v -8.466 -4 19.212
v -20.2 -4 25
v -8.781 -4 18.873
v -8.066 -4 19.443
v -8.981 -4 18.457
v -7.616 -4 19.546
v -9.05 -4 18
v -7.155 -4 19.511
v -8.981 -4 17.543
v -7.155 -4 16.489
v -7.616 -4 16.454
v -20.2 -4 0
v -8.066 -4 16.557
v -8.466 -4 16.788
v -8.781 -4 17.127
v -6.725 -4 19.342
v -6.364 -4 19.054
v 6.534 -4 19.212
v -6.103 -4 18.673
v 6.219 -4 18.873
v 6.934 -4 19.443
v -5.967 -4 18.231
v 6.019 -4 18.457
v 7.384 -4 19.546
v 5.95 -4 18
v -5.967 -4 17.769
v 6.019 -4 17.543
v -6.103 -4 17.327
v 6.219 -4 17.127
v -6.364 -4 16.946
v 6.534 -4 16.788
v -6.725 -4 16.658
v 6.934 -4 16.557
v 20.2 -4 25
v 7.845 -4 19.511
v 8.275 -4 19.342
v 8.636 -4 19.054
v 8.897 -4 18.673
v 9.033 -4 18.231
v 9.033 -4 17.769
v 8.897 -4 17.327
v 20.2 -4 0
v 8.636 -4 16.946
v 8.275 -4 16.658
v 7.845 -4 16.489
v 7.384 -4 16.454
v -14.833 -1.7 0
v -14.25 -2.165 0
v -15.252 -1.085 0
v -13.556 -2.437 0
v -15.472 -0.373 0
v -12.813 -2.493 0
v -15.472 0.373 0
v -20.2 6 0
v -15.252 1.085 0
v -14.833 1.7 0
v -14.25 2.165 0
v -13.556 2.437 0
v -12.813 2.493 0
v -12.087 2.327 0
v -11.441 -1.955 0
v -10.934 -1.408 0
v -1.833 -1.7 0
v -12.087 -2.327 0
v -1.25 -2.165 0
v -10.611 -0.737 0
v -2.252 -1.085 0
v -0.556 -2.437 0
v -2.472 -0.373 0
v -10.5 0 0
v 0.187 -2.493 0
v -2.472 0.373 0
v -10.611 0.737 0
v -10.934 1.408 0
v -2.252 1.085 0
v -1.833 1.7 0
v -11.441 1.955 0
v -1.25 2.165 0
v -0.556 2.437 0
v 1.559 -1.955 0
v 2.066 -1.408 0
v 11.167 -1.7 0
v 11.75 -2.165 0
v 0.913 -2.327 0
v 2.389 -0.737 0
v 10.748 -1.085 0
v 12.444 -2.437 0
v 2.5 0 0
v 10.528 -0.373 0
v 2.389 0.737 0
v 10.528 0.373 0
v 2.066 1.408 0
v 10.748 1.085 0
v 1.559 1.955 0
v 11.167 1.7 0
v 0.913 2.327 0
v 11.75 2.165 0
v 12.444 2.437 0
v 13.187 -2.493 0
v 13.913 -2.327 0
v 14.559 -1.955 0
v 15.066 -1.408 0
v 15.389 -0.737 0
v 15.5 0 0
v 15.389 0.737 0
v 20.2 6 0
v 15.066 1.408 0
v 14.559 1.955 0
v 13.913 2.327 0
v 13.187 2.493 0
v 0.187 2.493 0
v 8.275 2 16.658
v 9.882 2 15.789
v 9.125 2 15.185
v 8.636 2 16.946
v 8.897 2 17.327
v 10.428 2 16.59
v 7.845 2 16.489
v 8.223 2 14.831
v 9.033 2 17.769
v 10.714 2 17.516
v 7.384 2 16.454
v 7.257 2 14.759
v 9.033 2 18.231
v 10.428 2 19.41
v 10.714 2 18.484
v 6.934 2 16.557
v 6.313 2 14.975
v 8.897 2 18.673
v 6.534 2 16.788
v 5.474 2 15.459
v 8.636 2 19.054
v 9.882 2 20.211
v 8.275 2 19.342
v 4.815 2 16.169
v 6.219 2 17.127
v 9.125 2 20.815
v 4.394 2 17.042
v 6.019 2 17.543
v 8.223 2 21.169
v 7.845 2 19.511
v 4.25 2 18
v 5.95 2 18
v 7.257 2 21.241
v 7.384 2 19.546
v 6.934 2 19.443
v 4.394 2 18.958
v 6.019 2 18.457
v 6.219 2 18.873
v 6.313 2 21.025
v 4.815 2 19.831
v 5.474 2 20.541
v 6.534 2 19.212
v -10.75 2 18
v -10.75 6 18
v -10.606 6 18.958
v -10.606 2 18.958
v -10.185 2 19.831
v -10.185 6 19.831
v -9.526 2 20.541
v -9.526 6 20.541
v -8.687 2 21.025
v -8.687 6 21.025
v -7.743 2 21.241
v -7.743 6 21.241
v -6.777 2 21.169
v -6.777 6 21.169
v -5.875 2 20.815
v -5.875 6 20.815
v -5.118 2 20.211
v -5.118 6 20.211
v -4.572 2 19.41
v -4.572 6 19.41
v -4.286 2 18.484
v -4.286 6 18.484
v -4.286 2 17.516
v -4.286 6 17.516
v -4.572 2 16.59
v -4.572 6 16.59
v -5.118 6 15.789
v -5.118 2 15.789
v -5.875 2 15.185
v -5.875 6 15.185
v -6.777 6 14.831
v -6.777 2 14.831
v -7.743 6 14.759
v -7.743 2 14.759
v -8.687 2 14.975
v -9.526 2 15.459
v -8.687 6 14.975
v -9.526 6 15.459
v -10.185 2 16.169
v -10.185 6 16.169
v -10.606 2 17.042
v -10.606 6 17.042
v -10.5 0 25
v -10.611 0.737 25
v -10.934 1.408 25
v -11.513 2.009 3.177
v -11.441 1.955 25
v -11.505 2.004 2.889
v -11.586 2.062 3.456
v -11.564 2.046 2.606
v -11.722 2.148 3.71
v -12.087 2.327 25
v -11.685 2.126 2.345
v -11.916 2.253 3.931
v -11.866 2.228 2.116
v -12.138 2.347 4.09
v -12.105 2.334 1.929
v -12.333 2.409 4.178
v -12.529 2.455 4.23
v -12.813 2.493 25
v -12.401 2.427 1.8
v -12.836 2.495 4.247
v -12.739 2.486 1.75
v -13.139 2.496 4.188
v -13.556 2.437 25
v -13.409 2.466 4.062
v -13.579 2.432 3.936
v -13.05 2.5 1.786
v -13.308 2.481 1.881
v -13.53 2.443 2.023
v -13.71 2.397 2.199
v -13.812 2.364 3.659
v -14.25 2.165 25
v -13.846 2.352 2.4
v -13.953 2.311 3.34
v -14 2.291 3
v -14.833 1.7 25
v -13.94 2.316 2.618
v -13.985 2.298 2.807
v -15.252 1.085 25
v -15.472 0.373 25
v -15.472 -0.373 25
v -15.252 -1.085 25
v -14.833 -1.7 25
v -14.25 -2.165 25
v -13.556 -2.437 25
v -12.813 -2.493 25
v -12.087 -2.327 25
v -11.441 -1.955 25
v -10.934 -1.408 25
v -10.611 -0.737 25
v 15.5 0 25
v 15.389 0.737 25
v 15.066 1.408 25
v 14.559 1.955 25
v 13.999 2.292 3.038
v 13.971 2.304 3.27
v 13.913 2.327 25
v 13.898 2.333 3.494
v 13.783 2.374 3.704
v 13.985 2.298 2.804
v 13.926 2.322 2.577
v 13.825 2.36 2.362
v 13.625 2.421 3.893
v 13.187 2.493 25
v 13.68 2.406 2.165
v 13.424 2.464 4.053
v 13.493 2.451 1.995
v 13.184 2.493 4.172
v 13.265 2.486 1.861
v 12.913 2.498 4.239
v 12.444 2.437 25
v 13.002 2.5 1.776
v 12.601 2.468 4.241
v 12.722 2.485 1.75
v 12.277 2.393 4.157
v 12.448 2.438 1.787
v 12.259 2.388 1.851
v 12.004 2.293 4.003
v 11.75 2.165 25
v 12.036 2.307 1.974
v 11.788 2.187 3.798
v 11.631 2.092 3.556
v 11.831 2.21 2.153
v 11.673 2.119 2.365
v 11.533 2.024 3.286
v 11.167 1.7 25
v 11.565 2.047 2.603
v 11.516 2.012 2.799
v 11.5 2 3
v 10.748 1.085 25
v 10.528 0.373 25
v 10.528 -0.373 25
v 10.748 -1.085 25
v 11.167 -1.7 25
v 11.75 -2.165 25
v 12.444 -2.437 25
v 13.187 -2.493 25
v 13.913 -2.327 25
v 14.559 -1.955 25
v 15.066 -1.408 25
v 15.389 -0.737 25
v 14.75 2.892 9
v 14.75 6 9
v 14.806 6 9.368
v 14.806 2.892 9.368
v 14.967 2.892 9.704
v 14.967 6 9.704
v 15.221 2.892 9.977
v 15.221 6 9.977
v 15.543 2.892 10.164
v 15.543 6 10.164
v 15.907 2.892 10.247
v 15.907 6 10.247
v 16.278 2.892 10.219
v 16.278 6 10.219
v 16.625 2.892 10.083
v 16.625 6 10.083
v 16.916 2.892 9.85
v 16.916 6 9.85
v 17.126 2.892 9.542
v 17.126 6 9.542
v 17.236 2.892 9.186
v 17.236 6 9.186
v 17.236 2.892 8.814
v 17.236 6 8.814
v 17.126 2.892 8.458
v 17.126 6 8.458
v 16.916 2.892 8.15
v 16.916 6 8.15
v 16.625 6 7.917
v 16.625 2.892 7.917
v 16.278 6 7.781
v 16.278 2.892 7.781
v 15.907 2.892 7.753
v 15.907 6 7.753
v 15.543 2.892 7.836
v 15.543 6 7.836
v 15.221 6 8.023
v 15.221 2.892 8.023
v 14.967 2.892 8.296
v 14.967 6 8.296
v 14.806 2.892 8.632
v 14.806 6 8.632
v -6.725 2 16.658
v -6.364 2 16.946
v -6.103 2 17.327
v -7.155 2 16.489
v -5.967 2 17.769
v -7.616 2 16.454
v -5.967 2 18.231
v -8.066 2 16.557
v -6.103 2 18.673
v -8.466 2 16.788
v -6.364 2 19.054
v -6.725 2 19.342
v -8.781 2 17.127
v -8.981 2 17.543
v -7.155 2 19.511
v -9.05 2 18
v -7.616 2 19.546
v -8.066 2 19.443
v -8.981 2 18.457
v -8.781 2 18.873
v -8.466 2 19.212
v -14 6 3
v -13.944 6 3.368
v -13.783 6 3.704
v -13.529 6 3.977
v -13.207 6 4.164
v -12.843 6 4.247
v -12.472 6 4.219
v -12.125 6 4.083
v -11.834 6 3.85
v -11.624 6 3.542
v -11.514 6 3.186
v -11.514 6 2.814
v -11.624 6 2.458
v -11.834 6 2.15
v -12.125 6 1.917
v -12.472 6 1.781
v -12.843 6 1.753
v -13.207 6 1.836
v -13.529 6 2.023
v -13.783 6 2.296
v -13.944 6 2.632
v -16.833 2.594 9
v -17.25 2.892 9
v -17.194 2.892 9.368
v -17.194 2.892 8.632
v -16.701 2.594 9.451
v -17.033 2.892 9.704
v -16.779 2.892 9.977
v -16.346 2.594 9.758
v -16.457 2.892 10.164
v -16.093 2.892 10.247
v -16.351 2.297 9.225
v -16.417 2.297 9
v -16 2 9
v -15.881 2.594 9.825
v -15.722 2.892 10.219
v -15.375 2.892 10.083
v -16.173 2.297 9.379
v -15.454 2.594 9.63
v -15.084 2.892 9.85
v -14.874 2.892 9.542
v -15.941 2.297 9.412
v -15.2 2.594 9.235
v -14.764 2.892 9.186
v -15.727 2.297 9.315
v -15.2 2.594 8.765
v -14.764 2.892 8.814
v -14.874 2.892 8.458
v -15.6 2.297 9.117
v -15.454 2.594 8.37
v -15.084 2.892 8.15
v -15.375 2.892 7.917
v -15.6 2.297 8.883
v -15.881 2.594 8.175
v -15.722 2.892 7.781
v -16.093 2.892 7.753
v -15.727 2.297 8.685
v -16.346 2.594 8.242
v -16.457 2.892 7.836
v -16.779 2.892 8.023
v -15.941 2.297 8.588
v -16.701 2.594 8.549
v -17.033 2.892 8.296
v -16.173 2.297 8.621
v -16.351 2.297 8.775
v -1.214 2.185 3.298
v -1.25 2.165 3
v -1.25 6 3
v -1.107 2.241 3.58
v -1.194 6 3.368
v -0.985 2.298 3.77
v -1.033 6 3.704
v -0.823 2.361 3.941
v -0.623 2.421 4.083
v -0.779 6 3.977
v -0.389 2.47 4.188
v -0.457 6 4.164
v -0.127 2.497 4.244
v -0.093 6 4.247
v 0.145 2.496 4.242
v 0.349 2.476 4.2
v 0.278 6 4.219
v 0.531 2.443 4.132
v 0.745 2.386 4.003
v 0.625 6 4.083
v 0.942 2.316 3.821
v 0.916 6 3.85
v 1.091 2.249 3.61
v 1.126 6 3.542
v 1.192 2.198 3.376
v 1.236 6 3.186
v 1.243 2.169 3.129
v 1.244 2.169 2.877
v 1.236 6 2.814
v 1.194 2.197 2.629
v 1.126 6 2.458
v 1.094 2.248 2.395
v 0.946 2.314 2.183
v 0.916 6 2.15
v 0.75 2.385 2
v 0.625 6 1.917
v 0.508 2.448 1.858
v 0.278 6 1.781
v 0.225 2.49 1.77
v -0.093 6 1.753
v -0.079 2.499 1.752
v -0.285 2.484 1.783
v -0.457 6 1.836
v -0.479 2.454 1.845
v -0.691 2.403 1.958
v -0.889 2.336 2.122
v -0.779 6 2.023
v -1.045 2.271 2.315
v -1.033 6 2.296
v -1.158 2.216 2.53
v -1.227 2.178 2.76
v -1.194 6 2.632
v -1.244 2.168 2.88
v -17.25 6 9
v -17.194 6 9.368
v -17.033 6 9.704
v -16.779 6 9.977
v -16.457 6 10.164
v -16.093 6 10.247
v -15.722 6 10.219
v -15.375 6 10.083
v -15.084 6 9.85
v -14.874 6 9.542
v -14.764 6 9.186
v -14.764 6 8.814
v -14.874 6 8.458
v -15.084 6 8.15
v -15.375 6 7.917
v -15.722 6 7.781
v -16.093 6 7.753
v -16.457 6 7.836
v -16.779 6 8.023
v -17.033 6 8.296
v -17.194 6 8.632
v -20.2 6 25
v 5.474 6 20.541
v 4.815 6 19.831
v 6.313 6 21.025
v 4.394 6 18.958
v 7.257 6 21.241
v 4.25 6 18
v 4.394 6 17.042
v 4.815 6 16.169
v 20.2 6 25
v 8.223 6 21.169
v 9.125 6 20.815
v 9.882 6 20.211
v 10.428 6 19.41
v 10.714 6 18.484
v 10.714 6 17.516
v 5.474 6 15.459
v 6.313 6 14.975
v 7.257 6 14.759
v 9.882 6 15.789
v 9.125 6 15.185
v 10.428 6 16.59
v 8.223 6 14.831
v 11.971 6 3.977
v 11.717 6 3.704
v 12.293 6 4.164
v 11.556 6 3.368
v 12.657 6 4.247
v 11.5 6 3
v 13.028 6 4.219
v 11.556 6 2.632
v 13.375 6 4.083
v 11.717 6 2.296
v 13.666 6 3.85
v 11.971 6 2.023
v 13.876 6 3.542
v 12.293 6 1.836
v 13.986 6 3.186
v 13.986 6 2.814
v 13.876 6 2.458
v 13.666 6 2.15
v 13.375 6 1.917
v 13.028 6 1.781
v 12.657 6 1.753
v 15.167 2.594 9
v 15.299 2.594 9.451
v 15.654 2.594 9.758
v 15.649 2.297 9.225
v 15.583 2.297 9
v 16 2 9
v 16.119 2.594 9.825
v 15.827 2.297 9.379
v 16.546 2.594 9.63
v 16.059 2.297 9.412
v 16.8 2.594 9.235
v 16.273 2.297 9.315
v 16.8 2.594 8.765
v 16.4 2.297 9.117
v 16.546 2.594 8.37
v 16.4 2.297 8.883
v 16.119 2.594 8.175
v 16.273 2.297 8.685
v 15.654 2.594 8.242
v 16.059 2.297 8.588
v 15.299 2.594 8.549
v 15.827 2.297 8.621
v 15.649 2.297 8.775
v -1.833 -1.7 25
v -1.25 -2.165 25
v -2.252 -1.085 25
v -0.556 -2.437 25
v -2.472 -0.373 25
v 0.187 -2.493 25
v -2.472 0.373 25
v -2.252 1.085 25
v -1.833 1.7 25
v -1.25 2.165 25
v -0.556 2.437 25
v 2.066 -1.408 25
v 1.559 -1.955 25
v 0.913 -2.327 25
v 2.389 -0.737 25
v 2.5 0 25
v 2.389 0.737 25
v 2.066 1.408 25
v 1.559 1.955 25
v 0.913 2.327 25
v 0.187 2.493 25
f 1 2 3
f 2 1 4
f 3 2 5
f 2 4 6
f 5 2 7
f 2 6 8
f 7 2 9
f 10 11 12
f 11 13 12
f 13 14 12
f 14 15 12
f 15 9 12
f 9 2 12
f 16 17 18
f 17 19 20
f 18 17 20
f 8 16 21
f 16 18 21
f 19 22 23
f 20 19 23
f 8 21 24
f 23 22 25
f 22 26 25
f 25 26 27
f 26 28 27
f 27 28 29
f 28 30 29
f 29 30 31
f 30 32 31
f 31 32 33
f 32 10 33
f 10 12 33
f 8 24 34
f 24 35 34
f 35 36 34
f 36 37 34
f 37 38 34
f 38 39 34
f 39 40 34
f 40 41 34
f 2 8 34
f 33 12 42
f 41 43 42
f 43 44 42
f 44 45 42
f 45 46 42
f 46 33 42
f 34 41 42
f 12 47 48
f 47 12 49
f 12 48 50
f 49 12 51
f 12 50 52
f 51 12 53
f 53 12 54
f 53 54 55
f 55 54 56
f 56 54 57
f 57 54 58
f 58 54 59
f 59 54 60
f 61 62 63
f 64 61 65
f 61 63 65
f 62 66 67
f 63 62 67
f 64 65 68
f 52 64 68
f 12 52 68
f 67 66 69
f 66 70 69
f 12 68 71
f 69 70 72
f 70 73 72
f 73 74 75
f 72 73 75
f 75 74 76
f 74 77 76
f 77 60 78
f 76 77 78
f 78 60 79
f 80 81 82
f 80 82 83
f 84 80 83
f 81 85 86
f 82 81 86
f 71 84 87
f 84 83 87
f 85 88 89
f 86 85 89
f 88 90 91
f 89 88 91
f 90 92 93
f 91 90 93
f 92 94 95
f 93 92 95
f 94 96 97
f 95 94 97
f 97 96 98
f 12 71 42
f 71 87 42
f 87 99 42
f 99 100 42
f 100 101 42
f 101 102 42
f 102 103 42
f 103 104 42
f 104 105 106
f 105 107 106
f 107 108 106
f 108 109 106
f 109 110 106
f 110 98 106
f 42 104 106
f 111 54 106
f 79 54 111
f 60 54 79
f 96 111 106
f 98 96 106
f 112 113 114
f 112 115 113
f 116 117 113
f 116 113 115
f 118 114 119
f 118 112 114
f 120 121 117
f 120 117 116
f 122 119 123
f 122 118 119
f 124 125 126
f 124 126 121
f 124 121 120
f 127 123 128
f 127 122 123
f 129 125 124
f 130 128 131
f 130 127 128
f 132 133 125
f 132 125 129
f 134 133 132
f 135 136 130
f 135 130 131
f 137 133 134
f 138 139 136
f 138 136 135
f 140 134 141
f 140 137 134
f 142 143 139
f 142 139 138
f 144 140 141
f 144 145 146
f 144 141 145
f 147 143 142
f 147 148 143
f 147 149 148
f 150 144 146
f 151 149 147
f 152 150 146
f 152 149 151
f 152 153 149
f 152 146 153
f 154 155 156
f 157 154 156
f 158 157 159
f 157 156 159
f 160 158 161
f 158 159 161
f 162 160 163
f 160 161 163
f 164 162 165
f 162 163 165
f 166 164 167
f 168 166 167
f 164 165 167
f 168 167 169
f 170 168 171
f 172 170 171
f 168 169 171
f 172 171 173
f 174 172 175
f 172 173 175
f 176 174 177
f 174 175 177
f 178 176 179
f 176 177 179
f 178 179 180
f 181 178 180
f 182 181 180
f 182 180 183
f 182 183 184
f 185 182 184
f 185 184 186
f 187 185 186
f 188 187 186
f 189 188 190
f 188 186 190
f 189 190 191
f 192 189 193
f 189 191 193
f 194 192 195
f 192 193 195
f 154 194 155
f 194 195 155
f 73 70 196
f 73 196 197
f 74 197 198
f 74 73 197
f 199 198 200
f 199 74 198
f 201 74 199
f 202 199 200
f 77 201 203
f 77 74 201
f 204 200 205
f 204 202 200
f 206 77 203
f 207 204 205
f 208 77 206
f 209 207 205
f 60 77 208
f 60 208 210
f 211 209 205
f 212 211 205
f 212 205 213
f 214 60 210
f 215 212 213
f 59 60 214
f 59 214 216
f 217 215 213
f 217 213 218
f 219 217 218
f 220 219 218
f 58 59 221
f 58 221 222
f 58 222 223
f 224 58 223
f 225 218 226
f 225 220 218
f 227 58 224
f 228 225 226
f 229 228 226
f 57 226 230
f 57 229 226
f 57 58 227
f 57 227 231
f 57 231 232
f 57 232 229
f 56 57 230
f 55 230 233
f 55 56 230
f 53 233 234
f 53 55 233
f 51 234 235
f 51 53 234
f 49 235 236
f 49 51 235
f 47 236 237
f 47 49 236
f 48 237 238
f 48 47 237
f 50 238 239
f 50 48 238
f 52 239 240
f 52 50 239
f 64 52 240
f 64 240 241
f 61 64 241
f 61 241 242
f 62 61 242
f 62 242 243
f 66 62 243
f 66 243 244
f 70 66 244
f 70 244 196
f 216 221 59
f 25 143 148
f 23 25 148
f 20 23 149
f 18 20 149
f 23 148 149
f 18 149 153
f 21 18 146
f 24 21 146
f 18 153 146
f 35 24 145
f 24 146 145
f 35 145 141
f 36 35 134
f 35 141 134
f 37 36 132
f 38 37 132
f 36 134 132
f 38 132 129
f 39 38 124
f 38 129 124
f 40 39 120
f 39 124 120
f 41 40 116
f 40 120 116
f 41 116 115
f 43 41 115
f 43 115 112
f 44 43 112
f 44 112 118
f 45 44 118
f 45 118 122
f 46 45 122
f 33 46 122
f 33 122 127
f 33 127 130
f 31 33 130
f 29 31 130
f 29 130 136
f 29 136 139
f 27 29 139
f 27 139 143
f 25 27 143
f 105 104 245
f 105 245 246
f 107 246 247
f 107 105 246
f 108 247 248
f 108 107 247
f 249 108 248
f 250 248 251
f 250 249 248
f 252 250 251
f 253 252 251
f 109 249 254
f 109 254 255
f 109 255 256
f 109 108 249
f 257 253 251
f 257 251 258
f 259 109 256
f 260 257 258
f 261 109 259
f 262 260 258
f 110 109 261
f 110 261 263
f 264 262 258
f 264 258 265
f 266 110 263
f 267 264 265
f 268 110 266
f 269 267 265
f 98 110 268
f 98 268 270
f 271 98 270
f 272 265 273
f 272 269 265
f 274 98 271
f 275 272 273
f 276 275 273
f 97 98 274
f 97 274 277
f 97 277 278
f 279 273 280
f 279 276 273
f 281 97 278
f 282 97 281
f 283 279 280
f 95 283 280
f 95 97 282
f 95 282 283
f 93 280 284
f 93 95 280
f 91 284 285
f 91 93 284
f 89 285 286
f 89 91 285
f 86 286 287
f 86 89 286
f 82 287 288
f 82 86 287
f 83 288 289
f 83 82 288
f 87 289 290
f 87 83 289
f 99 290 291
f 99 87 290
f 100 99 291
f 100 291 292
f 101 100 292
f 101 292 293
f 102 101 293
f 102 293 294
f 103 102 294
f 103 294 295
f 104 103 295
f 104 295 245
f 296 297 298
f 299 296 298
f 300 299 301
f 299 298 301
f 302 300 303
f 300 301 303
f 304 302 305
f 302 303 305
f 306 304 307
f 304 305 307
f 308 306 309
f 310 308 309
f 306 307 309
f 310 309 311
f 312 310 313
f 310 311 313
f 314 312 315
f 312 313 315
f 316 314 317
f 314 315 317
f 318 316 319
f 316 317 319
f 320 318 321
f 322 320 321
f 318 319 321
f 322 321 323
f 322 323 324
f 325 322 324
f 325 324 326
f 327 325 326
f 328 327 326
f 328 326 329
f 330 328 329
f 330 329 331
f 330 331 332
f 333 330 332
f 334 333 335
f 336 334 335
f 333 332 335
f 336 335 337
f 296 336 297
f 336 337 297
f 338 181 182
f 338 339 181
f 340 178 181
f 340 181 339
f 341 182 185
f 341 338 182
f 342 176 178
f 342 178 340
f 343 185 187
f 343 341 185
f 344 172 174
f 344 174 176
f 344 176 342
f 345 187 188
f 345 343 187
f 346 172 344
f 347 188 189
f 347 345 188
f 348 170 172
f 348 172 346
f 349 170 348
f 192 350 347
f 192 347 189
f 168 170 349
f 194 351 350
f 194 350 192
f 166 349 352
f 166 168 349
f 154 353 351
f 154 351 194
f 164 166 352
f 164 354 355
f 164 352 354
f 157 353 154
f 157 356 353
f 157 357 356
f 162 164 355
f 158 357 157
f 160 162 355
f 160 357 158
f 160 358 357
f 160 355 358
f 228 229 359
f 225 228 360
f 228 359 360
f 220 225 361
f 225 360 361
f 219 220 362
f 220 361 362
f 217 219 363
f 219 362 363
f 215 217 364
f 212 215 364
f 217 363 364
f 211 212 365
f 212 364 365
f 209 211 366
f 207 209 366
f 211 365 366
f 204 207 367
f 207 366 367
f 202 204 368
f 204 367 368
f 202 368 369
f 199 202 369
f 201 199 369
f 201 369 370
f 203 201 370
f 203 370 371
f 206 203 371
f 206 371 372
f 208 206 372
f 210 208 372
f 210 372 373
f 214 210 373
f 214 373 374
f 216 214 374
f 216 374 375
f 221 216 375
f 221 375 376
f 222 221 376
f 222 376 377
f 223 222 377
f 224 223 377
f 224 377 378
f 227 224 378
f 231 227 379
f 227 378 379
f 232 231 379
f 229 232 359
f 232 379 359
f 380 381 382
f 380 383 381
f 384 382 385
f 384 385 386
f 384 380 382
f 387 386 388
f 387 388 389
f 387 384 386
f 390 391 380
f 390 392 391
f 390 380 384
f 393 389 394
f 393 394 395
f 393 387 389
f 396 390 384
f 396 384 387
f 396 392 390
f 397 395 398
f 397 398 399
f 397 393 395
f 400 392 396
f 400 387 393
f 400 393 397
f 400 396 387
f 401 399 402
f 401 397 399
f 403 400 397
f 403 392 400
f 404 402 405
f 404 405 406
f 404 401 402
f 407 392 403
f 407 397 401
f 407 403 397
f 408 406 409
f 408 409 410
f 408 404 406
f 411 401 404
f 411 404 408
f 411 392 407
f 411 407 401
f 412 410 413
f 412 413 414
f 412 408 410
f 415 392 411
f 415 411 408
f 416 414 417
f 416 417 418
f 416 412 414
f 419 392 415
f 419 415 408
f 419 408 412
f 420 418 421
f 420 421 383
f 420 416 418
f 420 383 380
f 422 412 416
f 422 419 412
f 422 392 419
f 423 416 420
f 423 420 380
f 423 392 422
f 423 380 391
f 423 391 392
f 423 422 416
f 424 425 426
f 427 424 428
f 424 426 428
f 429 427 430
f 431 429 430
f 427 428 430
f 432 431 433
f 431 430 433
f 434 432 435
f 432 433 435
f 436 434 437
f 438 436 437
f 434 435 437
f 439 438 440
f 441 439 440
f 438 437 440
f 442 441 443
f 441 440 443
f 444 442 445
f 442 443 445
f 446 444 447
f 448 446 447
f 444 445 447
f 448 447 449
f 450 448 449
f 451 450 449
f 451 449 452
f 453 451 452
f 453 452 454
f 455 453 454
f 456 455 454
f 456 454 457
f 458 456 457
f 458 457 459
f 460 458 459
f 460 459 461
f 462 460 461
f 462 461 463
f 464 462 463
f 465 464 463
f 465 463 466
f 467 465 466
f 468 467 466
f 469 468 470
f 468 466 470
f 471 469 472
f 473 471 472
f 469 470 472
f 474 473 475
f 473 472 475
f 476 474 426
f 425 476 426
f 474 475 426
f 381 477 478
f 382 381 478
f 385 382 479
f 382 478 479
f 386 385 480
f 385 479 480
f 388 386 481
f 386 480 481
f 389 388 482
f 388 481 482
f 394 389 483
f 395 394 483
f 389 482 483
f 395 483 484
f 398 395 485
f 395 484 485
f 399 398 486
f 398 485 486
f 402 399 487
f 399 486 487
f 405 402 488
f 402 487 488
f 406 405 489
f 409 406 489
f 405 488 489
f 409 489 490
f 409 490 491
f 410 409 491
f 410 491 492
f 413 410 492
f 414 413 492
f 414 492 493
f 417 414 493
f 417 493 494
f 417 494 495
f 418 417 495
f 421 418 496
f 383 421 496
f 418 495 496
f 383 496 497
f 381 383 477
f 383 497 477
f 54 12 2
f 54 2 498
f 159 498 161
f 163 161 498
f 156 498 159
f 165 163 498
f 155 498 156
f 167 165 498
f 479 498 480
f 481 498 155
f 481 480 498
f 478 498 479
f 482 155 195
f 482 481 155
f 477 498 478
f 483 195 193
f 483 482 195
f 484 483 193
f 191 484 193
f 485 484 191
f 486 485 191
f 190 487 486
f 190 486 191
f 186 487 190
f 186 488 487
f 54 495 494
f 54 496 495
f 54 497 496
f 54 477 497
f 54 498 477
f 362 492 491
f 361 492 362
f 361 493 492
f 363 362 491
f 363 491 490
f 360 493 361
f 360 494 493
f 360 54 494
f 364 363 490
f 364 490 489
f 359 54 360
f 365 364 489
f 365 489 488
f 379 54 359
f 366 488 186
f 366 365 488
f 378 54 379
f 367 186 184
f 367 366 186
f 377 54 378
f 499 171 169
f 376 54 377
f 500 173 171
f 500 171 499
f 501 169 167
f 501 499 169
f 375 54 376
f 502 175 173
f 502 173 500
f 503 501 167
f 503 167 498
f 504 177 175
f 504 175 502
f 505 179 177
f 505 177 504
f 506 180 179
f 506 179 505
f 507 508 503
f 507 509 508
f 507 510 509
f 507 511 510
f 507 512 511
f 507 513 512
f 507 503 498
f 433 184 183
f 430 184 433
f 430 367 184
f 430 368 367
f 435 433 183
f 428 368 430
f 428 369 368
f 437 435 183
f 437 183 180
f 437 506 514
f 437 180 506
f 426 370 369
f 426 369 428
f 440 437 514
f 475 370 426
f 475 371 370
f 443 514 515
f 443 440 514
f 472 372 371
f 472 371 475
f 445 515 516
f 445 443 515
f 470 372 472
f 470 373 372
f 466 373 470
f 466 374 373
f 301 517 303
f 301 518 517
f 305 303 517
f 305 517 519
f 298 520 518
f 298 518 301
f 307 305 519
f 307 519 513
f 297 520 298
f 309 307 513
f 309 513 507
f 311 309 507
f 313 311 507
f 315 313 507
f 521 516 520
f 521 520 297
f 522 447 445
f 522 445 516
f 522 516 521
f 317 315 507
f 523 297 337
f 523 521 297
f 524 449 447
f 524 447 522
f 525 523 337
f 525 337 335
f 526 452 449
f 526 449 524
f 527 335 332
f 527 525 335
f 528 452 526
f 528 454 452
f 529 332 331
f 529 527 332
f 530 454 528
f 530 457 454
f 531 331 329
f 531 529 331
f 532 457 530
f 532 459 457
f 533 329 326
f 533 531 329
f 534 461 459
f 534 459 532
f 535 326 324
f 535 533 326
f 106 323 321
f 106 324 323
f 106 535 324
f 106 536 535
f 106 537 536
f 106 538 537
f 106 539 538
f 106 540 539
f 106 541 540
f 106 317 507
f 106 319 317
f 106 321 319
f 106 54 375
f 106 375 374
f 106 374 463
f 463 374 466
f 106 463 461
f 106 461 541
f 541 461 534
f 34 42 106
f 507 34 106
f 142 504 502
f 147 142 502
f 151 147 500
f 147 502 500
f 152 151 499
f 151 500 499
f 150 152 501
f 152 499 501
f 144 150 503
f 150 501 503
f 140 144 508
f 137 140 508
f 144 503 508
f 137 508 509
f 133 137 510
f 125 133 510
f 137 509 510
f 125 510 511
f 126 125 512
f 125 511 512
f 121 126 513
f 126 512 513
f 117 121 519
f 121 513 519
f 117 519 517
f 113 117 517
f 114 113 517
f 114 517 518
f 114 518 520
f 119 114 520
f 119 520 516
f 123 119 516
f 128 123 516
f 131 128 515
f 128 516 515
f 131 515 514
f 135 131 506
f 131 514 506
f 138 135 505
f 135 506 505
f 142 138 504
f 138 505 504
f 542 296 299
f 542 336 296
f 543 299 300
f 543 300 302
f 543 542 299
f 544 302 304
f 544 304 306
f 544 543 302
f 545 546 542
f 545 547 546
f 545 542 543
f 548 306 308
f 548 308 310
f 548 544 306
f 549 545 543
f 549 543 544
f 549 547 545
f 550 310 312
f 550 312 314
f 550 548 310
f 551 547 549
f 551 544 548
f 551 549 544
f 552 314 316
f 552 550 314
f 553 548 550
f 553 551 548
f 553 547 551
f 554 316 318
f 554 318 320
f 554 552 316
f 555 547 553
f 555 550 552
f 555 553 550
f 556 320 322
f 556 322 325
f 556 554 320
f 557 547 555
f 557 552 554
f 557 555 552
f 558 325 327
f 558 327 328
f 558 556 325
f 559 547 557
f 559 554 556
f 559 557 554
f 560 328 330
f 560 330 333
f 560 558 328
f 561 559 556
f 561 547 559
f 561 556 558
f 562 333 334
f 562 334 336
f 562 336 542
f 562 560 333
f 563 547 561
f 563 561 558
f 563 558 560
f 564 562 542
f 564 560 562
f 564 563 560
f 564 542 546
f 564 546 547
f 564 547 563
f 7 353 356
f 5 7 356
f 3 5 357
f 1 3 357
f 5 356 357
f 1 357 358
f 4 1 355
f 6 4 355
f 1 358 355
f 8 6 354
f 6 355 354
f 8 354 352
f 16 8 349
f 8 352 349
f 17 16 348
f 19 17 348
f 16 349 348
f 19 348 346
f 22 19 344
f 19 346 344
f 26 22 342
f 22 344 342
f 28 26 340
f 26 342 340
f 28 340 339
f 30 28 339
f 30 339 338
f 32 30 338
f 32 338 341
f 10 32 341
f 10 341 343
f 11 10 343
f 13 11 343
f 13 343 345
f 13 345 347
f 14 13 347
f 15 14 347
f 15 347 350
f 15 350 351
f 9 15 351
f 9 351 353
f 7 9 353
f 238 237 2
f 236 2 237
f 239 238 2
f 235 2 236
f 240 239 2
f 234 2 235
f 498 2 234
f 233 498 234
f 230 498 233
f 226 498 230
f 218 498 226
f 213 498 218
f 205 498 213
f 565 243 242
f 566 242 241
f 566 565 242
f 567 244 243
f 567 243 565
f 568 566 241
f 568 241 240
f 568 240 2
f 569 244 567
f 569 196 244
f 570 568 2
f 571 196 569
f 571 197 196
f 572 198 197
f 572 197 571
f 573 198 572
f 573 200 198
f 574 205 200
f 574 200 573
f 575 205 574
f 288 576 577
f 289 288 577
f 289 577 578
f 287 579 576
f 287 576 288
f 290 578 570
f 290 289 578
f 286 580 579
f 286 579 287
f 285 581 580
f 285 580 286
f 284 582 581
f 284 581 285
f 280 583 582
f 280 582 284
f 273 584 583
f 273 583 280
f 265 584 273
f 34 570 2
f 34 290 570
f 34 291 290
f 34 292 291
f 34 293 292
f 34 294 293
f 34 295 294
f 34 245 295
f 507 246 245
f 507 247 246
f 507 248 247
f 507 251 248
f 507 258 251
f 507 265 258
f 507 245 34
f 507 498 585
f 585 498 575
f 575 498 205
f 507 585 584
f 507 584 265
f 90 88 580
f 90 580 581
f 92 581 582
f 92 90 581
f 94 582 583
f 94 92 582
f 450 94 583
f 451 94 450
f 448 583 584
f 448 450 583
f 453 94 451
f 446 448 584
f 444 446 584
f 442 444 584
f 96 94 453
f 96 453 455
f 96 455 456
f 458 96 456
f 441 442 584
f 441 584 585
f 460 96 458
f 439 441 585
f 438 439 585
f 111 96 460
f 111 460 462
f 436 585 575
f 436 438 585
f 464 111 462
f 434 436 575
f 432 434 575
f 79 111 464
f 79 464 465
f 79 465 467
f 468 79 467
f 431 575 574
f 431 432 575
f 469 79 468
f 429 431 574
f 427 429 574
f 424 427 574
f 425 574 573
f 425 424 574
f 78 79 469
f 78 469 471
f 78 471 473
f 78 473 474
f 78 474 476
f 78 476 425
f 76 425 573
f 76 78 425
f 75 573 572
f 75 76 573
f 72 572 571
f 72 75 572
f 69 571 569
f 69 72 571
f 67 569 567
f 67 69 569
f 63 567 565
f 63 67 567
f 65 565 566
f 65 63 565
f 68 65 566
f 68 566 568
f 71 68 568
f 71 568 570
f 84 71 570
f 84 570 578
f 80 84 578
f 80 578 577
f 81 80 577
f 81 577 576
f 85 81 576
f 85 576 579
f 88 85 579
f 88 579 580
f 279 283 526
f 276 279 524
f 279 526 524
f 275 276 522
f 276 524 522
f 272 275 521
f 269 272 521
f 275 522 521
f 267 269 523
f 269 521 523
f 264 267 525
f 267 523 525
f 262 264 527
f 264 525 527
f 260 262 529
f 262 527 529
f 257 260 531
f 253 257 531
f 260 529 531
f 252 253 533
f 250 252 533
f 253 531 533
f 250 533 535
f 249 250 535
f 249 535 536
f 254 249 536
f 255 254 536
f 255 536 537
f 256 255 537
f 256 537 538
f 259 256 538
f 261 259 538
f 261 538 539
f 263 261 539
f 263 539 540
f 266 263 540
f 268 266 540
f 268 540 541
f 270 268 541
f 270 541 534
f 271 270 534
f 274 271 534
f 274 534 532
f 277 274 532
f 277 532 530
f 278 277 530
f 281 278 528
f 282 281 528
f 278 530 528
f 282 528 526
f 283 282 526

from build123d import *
from OCP.BRepFilletAPI import BRepFilletAPI_MakeChamfer

# Parameters (mm, degrees)
SKETCH1_W           = 40.4
SKETCH1_H           = 10
SKETCH1_R           = 2.5
BOSS_EXTRUDE1_DEPTH = 25
SKETCH2_R           = 1.55
CUT_EXTRUDE1_DEPTH  = 34.66065953
CUT_EXTRUDE2_REACH  = 35.661
SKETCH3_R           = 1.25
SKETCH4_R           = 1.25
CUT_EXTRUDE3_DEPTH  = 4
CHAMFER1_SIZE       = 0.891616335
CHAMFER1_SIZE_2     = 1.25
SKETCH5_R           = 3.25
CUT_EXTRUDE4_DEPTH  = 4


with BuildPart() as part:
    # Sketch1 → Boss-Extrude1 (new body)
    with BuildSketch(Plane.XY):
        with Locations((0, 1)):
            Rectangle(SKETCH1_W, SKETCH1_H)
        Circle(SKETCH1_R, mode=Mode.SUBTRACT)
        with Locations((13, 0)):
            Circle(SKETCH1_R, mode=Mode.SUBTRACT)
        with Locations((-13, 0)):
            Circle(SKETCH1_R, mode=Mode.SUBTRACT)
    extrude(amount=BOSS_EXTRUDE1_DEPTH)

    # Sketch2 → Cut-Extrude1 (cut, through all)
    with BuildSketch(Plane(origin=(0, 6, 0), x_dir=(1, 0, 0), z_dir=(0, 1, 0))):
        with Locations(Location((7.5, -18, 0), (0, 0, 180))):
            Circle(SKETCH2_R)
        with Locations(Location((-7.5, -18, 0), (0, 0, 180))):
            Circle(SKETCH2_R)
    extrude(amount=-CUT_EXTRUDE1_DEPTH, mode=Mode.SUBTRACT)

    # Sketch3 → Cut-Extrude2 (cut, up to next)
    with BuildSketch(Plane(origin=(0, 6, 0), x_dir=(1, 0, 0), z_dir=(0, 1, 0)), mode=Mode.PRIVATE) as cut_extrude2_sk1:
        with Locations(Location((0, -3, 0), (0, 0, 180))):
            Circle(SKETCH3_R)
    cut_extrude2_tool1 = extrude(cut_extrude2_sk1.sketch, amount=-CUT_EXTRUDE2_REACH, mode=Mode.PRIVATE) & part.part
    # Sketch3 → Cut-Extrude2 (cut, up to next)
    with BuildSketch(Plane(origin=(0, 6, 0), x_dir=(1, 0, 0), z_dir=(0, 1, 0)), mode=Mode.PRIVATE) as cut_extrude2_sk2:
        with Locations(Location((-12.75, -3, 0), (0, 0, 180))):
            Circle(SKETCH3_R)
    cut_extrude2_tool2 = extrude(cut_extrude2_sk2.sketch, amount=-CUT_EXTRUDE2_REACH, mode=Mode.PRIVATE) & part.part
    # Sketch3 → Cut-Extrude2 (cut, up to next)
    with BuildSketch(Plane(origin=(0, 6, 0), x_dir=(1, 0, 0), z_dir=(0, 1, 0)), mode=Mode.PRIVATE) as cut_extrude2_sk3:
        with Locations(Location((12.75, -3, 0), (0, 0, 180))):
            Circle(SKETCH3_R)
    cut_extrude2_tool3 = extrude(cut_extrude2_sk3.sketch, amount=-CUT_EXTRUDE2_REACH, mode=Mode.PRIVATE) & part.part
    add(cut_extrude2_tool1.solids().sort_by_distance((0, 6, 3))[0], mode=Mode.SUBTRACT)
    add(cut_extrude2_tool2.solids().sort_by_distance((-12.75, 6, 3))[0], mode=Mode.SUBTRACT)
    add(cut_extrude2_tool3.solids().sort_by_distance((12.75, 6, 3))[0], mode=Mode.SUBTRACT)

    # Sketch4 → Cut-Extrude3 (cut)
    with BuildSketch(Plane(origin=(0, 6, 0), x_dir=(1, 0, 0), z_dir=(0, 1, 0))):
        with Locations(Location((-16, -9, 0), (0, 0, 180))):
            Circle(SKETCH4_R)
        with Locations(Location((16, -9, 0), (0, 0, 180))):
            Circle(SKETCH4_R)
    extrude(amount=-CUT_EXTRUDE3_DEPTH, mode=Mode.SUBTRACT)

    # Chamfer1
    chamfer1_edges_1 = [part.edges().sort_by_distance(p)[0] for p in [
        (-14.75, 2, 9),
    ]]
    chamfer1_side_1 = [part.faces().sort_by_distance(p)[0] for p in [
        (-14.75, 2.017832327, 9),
    ]]
    chamfer1_edges_2 = [part.edges().sort_by_distance(p)[0] for p in [
        (17.25, 2, 9),
    ]]
    chamfer1_side_2 = [part.faces().sort_by_distance(p)[0] for p in [
        (17.25, 2.017832327, 9),
    ]]
    chamfer1 = BRepFilletAPI_MakeChamfer(part.part.solid().wrapped)
    for e in chamfer1_edges_1:
        chamfer1.Add(CHAMFER1_SIZE - 0.0001, CHAMFER1_SIZE_2 - 0.0001, e.wrapped, chamfer1_side_1[0].wrapped)
    for e in chamfer1_edges_2:
        chamfer1.Add(CHAMFER1_SIZE - 0.0001, CHAMFER1_SIZE_2 - 0.0001, e.wrapped, chamfer1_side_2[0].wrapped)
    add(Compound.cast(chamfer1.Shape()), mode=Mode.REPLACE)  # a hair under: the kernel refuses the full size

    # Sketch5 → Cut-Extrude4 (cut)
    with BuildSketch(Plane(origin=(0, 6, 0), x_dir=(1, 0, 0), z_dir=(0, 1, 0))):
        with Locations(Location((7.5, -18, 0), (0, 0, 180))):
            Circle(SKETCH5_R)
        with Locations(Location((-7.5, -18, 0), (0, 0, 180))):
            Circle(SKETCH5_R)
    extrude(amount=-CUT_EXTRUDE4_DEPTH, mode=Mode.SUBTRACT)


solid = part.part
